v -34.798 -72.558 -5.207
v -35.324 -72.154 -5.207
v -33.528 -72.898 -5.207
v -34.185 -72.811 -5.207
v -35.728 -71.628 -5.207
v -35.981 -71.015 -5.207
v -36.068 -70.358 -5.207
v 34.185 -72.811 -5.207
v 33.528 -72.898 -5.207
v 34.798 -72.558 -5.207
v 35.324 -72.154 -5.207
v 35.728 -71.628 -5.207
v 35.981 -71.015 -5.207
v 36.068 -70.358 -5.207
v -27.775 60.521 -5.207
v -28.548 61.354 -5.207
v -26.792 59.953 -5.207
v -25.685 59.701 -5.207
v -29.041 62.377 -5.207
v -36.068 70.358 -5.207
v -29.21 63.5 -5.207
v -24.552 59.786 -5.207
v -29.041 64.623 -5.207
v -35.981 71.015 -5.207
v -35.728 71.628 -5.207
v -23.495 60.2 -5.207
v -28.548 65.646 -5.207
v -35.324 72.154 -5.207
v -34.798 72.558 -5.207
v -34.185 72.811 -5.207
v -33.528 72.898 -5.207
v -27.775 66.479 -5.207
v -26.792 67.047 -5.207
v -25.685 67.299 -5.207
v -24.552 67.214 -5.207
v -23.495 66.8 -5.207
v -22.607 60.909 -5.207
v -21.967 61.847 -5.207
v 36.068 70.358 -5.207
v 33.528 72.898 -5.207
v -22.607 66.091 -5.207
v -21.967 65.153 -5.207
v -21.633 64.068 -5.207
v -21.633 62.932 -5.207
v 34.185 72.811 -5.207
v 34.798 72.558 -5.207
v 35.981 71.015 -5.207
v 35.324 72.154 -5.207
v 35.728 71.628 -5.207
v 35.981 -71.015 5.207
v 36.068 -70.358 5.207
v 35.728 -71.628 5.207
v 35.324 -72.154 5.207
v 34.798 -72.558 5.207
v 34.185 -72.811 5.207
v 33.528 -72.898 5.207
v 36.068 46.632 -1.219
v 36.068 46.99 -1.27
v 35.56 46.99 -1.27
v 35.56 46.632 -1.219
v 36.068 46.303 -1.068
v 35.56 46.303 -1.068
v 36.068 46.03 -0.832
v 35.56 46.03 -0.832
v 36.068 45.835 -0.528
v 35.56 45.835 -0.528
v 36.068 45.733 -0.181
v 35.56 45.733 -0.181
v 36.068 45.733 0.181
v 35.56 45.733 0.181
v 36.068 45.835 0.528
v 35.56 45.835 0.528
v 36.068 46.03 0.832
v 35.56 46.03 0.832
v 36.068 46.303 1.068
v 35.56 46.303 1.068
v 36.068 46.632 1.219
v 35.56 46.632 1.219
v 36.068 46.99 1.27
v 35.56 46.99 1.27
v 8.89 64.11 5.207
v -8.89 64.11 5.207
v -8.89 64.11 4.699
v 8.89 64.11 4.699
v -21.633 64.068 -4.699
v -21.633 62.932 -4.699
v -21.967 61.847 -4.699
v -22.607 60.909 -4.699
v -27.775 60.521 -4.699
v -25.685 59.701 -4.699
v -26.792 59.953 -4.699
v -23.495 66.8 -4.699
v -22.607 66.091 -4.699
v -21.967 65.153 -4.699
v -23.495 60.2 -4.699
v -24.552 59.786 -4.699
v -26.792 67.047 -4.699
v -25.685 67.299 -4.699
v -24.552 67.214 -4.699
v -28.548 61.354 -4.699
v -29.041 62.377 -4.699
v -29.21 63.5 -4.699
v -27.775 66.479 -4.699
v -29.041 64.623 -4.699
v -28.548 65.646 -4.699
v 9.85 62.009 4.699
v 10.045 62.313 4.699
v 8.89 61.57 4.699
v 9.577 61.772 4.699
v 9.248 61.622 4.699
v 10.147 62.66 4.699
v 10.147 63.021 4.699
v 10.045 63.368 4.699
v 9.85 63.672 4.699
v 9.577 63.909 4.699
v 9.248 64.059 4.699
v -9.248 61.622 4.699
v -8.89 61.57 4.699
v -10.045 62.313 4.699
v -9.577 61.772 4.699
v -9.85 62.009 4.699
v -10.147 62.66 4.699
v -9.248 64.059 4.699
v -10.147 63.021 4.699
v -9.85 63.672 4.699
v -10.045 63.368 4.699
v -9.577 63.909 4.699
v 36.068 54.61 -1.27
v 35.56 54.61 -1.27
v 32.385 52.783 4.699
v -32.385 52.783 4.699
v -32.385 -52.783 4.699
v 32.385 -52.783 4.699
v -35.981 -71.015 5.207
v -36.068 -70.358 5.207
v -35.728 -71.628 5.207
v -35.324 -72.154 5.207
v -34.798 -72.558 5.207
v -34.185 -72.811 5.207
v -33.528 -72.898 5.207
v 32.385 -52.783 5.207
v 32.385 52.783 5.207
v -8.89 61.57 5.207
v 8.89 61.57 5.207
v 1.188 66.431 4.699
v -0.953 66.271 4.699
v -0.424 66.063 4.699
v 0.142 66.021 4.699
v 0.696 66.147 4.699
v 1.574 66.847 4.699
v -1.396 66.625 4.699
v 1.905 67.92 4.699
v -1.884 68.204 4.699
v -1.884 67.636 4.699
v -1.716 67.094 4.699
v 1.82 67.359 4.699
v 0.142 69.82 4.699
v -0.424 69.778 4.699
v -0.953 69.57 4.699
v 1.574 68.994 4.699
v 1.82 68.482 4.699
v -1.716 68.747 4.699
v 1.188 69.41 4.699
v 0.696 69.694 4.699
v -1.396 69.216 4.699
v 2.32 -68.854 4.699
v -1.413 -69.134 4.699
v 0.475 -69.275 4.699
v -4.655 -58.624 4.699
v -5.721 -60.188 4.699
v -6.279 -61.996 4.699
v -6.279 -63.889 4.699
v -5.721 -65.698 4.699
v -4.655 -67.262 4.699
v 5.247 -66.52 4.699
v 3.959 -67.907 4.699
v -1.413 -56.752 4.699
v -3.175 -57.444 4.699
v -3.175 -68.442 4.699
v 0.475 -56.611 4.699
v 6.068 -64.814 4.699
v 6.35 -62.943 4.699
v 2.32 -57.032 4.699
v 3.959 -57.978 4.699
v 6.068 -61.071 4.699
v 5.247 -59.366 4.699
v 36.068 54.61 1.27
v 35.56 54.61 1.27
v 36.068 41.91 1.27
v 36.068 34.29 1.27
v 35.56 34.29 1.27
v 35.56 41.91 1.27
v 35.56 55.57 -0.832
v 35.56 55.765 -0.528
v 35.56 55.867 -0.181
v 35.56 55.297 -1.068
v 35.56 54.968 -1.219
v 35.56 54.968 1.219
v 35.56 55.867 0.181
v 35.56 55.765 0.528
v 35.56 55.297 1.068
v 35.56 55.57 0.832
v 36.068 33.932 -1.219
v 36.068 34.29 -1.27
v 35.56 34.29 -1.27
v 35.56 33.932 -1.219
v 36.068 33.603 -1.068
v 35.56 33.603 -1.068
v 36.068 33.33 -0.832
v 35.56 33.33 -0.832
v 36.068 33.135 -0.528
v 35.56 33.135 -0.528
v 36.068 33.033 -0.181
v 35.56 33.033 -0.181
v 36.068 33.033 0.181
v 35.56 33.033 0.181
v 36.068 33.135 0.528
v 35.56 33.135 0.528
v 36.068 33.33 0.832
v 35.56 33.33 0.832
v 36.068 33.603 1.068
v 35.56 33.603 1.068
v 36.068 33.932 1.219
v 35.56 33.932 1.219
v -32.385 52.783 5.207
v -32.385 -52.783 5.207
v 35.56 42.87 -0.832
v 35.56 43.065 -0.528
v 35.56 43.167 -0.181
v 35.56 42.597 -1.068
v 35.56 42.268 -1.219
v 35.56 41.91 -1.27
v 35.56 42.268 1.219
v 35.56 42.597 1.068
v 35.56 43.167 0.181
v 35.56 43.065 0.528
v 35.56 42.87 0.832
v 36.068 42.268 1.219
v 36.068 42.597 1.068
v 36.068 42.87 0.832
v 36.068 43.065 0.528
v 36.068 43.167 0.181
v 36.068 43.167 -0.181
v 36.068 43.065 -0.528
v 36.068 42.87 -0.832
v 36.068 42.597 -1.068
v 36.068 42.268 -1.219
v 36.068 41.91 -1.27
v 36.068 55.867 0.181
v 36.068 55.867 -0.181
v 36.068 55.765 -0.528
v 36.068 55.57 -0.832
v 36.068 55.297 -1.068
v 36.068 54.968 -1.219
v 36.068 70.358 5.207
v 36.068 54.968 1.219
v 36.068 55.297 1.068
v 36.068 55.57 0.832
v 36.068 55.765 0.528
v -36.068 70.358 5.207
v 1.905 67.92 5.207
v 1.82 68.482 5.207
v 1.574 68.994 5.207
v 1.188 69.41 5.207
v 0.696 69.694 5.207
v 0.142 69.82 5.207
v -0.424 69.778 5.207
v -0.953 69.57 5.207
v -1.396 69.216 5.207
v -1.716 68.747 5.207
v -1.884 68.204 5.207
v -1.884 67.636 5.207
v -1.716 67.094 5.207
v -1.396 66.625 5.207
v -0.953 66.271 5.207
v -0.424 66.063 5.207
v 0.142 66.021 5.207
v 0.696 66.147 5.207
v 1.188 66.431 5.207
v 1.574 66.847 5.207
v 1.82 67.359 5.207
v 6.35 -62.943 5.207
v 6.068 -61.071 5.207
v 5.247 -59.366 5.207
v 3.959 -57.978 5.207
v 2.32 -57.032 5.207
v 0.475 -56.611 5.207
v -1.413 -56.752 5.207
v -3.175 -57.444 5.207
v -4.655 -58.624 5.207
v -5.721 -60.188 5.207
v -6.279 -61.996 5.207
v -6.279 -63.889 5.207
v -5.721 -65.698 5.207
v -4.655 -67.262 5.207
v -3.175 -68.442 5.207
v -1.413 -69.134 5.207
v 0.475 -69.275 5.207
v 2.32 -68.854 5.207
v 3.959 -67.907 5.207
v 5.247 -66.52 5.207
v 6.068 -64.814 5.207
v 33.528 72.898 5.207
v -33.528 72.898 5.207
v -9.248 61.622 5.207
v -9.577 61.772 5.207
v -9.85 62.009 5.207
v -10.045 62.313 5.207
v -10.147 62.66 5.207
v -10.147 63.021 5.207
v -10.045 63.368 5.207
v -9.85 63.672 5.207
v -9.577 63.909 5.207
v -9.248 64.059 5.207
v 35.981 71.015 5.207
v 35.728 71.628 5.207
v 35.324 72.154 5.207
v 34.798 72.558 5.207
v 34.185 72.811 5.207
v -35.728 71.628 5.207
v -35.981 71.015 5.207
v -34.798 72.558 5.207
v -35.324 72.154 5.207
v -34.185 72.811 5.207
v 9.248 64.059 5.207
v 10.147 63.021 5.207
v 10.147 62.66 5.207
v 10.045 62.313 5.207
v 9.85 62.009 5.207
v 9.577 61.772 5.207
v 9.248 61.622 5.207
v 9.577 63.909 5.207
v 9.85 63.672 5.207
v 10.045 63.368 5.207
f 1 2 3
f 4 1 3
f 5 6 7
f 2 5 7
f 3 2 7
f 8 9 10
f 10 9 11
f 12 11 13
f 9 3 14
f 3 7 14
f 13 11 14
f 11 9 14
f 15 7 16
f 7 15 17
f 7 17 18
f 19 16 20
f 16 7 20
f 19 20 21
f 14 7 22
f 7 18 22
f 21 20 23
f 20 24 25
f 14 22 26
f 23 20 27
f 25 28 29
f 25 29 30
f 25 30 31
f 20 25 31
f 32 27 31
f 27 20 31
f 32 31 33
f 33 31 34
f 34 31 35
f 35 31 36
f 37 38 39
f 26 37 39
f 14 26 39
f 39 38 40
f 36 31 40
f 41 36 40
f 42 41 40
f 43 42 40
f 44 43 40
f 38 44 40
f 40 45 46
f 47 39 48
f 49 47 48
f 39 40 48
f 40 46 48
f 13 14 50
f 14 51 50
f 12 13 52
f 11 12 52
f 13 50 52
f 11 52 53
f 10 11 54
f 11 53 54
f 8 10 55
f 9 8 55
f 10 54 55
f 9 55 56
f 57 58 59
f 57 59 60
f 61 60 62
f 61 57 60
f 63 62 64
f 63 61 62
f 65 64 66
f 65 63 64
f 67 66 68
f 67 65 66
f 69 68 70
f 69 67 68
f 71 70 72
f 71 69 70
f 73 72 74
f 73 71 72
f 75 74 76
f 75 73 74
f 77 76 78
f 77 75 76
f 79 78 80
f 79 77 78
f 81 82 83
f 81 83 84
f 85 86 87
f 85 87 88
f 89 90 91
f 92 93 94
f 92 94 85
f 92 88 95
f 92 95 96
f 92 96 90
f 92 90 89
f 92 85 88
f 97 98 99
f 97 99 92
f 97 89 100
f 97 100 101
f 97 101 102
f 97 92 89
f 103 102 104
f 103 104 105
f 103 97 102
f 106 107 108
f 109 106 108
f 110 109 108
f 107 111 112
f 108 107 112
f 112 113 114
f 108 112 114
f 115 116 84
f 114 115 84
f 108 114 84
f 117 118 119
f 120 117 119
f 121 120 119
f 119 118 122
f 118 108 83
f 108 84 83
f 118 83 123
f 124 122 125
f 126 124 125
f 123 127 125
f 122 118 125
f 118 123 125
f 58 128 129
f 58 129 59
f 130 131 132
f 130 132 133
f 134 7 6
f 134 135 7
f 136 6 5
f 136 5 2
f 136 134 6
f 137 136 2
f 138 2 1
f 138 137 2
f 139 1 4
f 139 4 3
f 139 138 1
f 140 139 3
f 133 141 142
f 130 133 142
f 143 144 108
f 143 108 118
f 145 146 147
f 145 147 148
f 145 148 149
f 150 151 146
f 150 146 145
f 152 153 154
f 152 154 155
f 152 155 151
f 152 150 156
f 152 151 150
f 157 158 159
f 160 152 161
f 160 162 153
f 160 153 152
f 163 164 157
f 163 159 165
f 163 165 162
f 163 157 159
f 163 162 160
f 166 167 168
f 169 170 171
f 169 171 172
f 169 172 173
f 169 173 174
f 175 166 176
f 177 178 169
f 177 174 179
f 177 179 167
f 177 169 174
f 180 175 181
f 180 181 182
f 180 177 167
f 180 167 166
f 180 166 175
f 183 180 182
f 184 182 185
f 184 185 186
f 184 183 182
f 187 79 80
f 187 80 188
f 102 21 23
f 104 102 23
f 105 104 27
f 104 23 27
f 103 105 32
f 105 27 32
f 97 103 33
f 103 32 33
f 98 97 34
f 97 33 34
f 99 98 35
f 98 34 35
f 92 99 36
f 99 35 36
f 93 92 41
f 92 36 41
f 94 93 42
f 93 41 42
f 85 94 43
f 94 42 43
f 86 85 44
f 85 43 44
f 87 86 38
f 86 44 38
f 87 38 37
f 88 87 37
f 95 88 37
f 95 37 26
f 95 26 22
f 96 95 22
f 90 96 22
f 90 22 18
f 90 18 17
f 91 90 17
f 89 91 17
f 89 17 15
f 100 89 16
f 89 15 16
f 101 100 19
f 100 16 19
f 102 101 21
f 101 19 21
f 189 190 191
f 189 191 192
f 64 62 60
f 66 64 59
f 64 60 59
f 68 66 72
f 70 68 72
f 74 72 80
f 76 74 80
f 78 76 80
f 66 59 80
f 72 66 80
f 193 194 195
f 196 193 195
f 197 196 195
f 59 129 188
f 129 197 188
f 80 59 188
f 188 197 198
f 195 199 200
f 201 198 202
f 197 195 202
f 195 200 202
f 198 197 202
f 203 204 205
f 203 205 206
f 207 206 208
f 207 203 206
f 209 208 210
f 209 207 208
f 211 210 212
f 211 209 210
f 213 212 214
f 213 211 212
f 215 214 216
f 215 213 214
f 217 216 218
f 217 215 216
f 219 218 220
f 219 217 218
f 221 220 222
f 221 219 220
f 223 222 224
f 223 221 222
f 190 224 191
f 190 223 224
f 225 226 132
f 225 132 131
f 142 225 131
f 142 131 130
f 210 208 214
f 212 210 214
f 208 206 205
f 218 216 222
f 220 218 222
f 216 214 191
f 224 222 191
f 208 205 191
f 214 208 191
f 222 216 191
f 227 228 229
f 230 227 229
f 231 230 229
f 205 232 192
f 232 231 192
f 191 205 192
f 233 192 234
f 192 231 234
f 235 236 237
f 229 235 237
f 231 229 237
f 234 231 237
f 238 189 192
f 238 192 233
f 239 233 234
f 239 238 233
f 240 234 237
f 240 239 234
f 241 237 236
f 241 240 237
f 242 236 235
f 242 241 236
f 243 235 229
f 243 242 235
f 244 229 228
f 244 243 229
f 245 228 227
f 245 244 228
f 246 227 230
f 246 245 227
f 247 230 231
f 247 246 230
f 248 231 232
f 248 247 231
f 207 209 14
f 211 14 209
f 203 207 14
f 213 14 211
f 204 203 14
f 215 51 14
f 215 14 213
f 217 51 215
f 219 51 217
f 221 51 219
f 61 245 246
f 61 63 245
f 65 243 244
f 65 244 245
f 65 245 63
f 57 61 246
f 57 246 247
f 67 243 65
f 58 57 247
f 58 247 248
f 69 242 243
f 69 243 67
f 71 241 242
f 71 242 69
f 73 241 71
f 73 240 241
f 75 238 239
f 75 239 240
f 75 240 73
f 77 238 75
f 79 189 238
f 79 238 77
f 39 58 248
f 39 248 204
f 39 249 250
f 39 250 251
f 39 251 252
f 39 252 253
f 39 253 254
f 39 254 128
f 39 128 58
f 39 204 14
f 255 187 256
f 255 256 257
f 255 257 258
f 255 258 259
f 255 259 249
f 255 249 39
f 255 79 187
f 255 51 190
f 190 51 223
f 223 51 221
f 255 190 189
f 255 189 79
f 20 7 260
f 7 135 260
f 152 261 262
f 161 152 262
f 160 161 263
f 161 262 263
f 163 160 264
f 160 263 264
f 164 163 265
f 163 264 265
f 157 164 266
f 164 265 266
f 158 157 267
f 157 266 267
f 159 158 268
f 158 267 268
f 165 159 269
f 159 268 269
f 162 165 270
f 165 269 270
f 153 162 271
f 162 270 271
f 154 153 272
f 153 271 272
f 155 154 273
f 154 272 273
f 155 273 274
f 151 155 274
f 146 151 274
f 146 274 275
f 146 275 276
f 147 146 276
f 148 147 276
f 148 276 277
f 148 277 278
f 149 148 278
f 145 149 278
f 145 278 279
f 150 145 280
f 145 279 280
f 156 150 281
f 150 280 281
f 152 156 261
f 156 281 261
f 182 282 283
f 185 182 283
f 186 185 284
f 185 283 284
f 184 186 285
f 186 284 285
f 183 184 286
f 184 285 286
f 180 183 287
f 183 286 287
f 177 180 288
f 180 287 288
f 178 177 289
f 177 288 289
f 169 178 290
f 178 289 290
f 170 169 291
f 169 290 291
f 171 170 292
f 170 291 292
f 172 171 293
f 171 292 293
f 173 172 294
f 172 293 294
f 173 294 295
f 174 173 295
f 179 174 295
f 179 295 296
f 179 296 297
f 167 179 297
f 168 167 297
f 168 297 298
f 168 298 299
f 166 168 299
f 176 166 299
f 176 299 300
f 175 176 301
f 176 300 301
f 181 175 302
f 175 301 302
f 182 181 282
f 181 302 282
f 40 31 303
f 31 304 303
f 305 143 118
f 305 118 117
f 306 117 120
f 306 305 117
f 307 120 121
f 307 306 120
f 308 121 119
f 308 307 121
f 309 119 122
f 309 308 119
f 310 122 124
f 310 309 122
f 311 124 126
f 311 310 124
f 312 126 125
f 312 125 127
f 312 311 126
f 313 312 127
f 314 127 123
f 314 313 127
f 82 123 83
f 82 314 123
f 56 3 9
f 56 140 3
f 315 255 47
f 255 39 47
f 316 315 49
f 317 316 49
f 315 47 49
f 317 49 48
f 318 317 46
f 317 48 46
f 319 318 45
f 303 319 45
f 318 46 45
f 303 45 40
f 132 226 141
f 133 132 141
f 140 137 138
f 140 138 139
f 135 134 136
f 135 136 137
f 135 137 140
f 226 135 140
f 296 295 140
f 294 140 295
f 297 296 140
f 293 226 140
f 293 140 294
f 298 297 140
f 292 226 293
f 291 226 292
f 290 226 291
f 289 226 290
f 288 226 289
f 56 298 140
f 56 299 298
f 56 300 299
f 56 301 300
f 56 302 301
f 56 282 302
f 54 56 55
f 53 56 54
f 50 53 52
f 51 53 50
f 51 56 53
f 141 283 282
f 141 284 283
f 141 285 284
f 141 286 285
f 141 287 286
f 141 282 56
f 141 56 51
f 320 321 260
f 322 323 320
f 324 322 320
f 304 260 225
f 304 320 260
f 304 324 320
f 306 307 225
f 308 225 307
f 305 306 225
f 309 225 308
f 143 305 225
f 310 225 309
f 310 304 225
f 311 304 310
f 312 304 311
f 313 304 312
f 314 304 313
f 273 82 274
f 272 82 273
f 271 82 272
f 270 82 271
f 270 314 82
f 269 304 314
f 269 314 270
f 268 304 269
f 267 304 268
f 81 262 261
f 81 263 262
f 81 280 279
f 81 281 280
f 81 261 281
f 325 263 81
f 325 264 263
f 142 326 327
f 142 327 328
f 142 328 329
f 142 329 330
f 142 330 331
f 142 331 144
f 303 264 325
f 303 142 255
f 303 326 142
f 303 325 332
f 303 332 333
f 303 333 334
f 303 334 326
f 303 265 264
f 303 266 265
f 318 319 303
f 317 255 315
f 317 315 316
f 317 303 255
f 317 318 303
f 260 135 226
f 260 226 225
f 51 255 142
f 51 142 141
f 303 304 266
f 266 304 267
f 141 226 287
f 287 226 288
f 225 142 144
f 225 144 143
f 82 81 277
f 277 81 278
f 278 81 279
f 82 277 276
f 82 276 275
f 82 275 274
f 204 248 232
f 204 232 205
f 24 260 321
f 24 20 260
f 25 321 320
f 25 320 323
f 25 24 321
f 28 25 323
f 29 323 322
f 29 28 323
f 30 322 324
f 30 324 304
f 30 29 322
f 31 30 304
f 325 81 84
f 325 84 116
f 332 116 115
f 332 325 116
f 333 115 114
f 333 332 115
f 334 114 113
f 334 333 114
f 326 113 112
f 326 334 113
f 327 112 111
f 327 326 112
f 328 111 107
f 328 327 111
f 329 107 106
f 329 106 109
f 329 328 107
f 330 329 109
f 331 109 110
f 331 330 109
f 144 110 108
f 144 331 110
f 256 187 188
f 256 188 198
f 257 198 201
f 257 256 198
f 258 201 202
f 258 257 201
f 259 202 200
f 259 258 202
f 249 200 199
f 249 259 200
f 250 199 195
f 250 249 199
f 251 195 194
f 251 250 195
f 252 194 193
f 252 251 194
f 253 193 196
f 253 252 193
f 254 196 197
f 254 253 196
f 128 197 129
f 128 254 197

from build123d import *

# Parameters (mm, degrees)
SKETCH1_W           = 72.136
SKETCH1_H           = 145.796
BOSS_EXTRUDE1_DEPTH = 5.207
FILLET1_R           = 2.54
SKETCH2_R           = 6.35
SKETCH2_R_2         = 1.905
SKETCH2_W           = 64.77
SKETCH2_H           = 105.56555142
CUT_EXTRUDE1_DEPTH  = 0.508
SKETCH4_R           = 3.81
CUT_EXTRUDE2_DEPTH  = 0.508
CUT_EXTRUDE3_DEPTH  = 0.508


with BuildPart() as part:
    # Sketch1 → Boss-Extrude1 (new, symmetric)
    with BuildSketch(Plane.XY):
        Rectangle(SKETCH1_W, SKETCH1_H)
    extrude(amount=BOSS_EXTRUDE1_DEPTH, both=True)

    # Fillet1
    fillet1_edges = [part.edges().sort_by_distance(p)[0] for p in [
        (36.068, -72.898, 0),
        (-36.068, -72.898, 0),
        (-36.068, 72.898, 0),
        (36.068, 72.898, 0),
    ]]
    fillet(fillet1_edges, radius=FILLET1_R)

    # Sketch2 → Cut-Extrude1 (cut)
    with BuildSketch(Plane.XY.offset(5.207)):
        with Locations((0, -62.94277571)):
            Circle(SKETCH2_R)
        with Locations((0, 67.920387855)):
            Circle(SKETCH2_R_2)
        Rectangle(SKETCH2_W, SKETCH2_H)
        with BuildLine():
            Line((-8.89, 64.110387855), (8.89, 64.110387855))
            ThreePointArc((8.89, 64.110387855), (10.16, 62.840387855), (8.89, 61.570387855))
            Line((8.89, 61.570387855), (-8.89, 61.570387855))
            ThreePointArc((-8.89, 61.570387855), (-10.16, 62.840387855), (-8.89, 64.110387855))
        make_face()
    extrude(amount=-CUT_EXTRUDE1_DEPTH, mode=Mode.SUBTRACT)

    # Sketch4 → Cut-Extrude2 (cut)
    with BuildSketch(Plane(origin=(0, 0, -5.207), x_dir=(-1, 0, 0), z_dir=(0, 0, -1))):
        with Locations((25.4, 63.5)):
            Circle(SKETCH4_R)
    extrude(amount=-CUT_EXTRUDE2_DEPTH, mode=Mode.SUBTRACT)

    # Sketch5 → Cut-Extrude3 (cut)
    with BuildSketch(Plane(origin=(36.068, 0, 0), x_dir=(0, 0, -1), z_dir=(1, 0, 0))):
        with BuildLine():
            Line((1.27, 54.61), (1.27, 46.99))
            ThreePointArc((1.27, 46.99), (0, 45.72), (-1.27, 46.99))
            Line((-1.27, 46.99), (-1.27, 54.61))
            ThreePointArc((-1.27, 54.61), (0, 55.88), (1.27, 54.61))
        make_face()
        with BuildLine():
            Line((1.27, 41.91), (1.27, 34.29))
            ThreePointArc((1.27, 34.29), (0, 33.02), (-1.27, 34.29))
            Line((-1.27, 34.29), (-1.27, 41.91))
            ThreePointArc((-1.27, 41.91), (0, 43.18), (1.27, 41.91))
        make_face()
    extrude(amount=-CUT_EXTRUDE3_DEPTH, mode=Mode.SUBTRACT)


solid = part.part
